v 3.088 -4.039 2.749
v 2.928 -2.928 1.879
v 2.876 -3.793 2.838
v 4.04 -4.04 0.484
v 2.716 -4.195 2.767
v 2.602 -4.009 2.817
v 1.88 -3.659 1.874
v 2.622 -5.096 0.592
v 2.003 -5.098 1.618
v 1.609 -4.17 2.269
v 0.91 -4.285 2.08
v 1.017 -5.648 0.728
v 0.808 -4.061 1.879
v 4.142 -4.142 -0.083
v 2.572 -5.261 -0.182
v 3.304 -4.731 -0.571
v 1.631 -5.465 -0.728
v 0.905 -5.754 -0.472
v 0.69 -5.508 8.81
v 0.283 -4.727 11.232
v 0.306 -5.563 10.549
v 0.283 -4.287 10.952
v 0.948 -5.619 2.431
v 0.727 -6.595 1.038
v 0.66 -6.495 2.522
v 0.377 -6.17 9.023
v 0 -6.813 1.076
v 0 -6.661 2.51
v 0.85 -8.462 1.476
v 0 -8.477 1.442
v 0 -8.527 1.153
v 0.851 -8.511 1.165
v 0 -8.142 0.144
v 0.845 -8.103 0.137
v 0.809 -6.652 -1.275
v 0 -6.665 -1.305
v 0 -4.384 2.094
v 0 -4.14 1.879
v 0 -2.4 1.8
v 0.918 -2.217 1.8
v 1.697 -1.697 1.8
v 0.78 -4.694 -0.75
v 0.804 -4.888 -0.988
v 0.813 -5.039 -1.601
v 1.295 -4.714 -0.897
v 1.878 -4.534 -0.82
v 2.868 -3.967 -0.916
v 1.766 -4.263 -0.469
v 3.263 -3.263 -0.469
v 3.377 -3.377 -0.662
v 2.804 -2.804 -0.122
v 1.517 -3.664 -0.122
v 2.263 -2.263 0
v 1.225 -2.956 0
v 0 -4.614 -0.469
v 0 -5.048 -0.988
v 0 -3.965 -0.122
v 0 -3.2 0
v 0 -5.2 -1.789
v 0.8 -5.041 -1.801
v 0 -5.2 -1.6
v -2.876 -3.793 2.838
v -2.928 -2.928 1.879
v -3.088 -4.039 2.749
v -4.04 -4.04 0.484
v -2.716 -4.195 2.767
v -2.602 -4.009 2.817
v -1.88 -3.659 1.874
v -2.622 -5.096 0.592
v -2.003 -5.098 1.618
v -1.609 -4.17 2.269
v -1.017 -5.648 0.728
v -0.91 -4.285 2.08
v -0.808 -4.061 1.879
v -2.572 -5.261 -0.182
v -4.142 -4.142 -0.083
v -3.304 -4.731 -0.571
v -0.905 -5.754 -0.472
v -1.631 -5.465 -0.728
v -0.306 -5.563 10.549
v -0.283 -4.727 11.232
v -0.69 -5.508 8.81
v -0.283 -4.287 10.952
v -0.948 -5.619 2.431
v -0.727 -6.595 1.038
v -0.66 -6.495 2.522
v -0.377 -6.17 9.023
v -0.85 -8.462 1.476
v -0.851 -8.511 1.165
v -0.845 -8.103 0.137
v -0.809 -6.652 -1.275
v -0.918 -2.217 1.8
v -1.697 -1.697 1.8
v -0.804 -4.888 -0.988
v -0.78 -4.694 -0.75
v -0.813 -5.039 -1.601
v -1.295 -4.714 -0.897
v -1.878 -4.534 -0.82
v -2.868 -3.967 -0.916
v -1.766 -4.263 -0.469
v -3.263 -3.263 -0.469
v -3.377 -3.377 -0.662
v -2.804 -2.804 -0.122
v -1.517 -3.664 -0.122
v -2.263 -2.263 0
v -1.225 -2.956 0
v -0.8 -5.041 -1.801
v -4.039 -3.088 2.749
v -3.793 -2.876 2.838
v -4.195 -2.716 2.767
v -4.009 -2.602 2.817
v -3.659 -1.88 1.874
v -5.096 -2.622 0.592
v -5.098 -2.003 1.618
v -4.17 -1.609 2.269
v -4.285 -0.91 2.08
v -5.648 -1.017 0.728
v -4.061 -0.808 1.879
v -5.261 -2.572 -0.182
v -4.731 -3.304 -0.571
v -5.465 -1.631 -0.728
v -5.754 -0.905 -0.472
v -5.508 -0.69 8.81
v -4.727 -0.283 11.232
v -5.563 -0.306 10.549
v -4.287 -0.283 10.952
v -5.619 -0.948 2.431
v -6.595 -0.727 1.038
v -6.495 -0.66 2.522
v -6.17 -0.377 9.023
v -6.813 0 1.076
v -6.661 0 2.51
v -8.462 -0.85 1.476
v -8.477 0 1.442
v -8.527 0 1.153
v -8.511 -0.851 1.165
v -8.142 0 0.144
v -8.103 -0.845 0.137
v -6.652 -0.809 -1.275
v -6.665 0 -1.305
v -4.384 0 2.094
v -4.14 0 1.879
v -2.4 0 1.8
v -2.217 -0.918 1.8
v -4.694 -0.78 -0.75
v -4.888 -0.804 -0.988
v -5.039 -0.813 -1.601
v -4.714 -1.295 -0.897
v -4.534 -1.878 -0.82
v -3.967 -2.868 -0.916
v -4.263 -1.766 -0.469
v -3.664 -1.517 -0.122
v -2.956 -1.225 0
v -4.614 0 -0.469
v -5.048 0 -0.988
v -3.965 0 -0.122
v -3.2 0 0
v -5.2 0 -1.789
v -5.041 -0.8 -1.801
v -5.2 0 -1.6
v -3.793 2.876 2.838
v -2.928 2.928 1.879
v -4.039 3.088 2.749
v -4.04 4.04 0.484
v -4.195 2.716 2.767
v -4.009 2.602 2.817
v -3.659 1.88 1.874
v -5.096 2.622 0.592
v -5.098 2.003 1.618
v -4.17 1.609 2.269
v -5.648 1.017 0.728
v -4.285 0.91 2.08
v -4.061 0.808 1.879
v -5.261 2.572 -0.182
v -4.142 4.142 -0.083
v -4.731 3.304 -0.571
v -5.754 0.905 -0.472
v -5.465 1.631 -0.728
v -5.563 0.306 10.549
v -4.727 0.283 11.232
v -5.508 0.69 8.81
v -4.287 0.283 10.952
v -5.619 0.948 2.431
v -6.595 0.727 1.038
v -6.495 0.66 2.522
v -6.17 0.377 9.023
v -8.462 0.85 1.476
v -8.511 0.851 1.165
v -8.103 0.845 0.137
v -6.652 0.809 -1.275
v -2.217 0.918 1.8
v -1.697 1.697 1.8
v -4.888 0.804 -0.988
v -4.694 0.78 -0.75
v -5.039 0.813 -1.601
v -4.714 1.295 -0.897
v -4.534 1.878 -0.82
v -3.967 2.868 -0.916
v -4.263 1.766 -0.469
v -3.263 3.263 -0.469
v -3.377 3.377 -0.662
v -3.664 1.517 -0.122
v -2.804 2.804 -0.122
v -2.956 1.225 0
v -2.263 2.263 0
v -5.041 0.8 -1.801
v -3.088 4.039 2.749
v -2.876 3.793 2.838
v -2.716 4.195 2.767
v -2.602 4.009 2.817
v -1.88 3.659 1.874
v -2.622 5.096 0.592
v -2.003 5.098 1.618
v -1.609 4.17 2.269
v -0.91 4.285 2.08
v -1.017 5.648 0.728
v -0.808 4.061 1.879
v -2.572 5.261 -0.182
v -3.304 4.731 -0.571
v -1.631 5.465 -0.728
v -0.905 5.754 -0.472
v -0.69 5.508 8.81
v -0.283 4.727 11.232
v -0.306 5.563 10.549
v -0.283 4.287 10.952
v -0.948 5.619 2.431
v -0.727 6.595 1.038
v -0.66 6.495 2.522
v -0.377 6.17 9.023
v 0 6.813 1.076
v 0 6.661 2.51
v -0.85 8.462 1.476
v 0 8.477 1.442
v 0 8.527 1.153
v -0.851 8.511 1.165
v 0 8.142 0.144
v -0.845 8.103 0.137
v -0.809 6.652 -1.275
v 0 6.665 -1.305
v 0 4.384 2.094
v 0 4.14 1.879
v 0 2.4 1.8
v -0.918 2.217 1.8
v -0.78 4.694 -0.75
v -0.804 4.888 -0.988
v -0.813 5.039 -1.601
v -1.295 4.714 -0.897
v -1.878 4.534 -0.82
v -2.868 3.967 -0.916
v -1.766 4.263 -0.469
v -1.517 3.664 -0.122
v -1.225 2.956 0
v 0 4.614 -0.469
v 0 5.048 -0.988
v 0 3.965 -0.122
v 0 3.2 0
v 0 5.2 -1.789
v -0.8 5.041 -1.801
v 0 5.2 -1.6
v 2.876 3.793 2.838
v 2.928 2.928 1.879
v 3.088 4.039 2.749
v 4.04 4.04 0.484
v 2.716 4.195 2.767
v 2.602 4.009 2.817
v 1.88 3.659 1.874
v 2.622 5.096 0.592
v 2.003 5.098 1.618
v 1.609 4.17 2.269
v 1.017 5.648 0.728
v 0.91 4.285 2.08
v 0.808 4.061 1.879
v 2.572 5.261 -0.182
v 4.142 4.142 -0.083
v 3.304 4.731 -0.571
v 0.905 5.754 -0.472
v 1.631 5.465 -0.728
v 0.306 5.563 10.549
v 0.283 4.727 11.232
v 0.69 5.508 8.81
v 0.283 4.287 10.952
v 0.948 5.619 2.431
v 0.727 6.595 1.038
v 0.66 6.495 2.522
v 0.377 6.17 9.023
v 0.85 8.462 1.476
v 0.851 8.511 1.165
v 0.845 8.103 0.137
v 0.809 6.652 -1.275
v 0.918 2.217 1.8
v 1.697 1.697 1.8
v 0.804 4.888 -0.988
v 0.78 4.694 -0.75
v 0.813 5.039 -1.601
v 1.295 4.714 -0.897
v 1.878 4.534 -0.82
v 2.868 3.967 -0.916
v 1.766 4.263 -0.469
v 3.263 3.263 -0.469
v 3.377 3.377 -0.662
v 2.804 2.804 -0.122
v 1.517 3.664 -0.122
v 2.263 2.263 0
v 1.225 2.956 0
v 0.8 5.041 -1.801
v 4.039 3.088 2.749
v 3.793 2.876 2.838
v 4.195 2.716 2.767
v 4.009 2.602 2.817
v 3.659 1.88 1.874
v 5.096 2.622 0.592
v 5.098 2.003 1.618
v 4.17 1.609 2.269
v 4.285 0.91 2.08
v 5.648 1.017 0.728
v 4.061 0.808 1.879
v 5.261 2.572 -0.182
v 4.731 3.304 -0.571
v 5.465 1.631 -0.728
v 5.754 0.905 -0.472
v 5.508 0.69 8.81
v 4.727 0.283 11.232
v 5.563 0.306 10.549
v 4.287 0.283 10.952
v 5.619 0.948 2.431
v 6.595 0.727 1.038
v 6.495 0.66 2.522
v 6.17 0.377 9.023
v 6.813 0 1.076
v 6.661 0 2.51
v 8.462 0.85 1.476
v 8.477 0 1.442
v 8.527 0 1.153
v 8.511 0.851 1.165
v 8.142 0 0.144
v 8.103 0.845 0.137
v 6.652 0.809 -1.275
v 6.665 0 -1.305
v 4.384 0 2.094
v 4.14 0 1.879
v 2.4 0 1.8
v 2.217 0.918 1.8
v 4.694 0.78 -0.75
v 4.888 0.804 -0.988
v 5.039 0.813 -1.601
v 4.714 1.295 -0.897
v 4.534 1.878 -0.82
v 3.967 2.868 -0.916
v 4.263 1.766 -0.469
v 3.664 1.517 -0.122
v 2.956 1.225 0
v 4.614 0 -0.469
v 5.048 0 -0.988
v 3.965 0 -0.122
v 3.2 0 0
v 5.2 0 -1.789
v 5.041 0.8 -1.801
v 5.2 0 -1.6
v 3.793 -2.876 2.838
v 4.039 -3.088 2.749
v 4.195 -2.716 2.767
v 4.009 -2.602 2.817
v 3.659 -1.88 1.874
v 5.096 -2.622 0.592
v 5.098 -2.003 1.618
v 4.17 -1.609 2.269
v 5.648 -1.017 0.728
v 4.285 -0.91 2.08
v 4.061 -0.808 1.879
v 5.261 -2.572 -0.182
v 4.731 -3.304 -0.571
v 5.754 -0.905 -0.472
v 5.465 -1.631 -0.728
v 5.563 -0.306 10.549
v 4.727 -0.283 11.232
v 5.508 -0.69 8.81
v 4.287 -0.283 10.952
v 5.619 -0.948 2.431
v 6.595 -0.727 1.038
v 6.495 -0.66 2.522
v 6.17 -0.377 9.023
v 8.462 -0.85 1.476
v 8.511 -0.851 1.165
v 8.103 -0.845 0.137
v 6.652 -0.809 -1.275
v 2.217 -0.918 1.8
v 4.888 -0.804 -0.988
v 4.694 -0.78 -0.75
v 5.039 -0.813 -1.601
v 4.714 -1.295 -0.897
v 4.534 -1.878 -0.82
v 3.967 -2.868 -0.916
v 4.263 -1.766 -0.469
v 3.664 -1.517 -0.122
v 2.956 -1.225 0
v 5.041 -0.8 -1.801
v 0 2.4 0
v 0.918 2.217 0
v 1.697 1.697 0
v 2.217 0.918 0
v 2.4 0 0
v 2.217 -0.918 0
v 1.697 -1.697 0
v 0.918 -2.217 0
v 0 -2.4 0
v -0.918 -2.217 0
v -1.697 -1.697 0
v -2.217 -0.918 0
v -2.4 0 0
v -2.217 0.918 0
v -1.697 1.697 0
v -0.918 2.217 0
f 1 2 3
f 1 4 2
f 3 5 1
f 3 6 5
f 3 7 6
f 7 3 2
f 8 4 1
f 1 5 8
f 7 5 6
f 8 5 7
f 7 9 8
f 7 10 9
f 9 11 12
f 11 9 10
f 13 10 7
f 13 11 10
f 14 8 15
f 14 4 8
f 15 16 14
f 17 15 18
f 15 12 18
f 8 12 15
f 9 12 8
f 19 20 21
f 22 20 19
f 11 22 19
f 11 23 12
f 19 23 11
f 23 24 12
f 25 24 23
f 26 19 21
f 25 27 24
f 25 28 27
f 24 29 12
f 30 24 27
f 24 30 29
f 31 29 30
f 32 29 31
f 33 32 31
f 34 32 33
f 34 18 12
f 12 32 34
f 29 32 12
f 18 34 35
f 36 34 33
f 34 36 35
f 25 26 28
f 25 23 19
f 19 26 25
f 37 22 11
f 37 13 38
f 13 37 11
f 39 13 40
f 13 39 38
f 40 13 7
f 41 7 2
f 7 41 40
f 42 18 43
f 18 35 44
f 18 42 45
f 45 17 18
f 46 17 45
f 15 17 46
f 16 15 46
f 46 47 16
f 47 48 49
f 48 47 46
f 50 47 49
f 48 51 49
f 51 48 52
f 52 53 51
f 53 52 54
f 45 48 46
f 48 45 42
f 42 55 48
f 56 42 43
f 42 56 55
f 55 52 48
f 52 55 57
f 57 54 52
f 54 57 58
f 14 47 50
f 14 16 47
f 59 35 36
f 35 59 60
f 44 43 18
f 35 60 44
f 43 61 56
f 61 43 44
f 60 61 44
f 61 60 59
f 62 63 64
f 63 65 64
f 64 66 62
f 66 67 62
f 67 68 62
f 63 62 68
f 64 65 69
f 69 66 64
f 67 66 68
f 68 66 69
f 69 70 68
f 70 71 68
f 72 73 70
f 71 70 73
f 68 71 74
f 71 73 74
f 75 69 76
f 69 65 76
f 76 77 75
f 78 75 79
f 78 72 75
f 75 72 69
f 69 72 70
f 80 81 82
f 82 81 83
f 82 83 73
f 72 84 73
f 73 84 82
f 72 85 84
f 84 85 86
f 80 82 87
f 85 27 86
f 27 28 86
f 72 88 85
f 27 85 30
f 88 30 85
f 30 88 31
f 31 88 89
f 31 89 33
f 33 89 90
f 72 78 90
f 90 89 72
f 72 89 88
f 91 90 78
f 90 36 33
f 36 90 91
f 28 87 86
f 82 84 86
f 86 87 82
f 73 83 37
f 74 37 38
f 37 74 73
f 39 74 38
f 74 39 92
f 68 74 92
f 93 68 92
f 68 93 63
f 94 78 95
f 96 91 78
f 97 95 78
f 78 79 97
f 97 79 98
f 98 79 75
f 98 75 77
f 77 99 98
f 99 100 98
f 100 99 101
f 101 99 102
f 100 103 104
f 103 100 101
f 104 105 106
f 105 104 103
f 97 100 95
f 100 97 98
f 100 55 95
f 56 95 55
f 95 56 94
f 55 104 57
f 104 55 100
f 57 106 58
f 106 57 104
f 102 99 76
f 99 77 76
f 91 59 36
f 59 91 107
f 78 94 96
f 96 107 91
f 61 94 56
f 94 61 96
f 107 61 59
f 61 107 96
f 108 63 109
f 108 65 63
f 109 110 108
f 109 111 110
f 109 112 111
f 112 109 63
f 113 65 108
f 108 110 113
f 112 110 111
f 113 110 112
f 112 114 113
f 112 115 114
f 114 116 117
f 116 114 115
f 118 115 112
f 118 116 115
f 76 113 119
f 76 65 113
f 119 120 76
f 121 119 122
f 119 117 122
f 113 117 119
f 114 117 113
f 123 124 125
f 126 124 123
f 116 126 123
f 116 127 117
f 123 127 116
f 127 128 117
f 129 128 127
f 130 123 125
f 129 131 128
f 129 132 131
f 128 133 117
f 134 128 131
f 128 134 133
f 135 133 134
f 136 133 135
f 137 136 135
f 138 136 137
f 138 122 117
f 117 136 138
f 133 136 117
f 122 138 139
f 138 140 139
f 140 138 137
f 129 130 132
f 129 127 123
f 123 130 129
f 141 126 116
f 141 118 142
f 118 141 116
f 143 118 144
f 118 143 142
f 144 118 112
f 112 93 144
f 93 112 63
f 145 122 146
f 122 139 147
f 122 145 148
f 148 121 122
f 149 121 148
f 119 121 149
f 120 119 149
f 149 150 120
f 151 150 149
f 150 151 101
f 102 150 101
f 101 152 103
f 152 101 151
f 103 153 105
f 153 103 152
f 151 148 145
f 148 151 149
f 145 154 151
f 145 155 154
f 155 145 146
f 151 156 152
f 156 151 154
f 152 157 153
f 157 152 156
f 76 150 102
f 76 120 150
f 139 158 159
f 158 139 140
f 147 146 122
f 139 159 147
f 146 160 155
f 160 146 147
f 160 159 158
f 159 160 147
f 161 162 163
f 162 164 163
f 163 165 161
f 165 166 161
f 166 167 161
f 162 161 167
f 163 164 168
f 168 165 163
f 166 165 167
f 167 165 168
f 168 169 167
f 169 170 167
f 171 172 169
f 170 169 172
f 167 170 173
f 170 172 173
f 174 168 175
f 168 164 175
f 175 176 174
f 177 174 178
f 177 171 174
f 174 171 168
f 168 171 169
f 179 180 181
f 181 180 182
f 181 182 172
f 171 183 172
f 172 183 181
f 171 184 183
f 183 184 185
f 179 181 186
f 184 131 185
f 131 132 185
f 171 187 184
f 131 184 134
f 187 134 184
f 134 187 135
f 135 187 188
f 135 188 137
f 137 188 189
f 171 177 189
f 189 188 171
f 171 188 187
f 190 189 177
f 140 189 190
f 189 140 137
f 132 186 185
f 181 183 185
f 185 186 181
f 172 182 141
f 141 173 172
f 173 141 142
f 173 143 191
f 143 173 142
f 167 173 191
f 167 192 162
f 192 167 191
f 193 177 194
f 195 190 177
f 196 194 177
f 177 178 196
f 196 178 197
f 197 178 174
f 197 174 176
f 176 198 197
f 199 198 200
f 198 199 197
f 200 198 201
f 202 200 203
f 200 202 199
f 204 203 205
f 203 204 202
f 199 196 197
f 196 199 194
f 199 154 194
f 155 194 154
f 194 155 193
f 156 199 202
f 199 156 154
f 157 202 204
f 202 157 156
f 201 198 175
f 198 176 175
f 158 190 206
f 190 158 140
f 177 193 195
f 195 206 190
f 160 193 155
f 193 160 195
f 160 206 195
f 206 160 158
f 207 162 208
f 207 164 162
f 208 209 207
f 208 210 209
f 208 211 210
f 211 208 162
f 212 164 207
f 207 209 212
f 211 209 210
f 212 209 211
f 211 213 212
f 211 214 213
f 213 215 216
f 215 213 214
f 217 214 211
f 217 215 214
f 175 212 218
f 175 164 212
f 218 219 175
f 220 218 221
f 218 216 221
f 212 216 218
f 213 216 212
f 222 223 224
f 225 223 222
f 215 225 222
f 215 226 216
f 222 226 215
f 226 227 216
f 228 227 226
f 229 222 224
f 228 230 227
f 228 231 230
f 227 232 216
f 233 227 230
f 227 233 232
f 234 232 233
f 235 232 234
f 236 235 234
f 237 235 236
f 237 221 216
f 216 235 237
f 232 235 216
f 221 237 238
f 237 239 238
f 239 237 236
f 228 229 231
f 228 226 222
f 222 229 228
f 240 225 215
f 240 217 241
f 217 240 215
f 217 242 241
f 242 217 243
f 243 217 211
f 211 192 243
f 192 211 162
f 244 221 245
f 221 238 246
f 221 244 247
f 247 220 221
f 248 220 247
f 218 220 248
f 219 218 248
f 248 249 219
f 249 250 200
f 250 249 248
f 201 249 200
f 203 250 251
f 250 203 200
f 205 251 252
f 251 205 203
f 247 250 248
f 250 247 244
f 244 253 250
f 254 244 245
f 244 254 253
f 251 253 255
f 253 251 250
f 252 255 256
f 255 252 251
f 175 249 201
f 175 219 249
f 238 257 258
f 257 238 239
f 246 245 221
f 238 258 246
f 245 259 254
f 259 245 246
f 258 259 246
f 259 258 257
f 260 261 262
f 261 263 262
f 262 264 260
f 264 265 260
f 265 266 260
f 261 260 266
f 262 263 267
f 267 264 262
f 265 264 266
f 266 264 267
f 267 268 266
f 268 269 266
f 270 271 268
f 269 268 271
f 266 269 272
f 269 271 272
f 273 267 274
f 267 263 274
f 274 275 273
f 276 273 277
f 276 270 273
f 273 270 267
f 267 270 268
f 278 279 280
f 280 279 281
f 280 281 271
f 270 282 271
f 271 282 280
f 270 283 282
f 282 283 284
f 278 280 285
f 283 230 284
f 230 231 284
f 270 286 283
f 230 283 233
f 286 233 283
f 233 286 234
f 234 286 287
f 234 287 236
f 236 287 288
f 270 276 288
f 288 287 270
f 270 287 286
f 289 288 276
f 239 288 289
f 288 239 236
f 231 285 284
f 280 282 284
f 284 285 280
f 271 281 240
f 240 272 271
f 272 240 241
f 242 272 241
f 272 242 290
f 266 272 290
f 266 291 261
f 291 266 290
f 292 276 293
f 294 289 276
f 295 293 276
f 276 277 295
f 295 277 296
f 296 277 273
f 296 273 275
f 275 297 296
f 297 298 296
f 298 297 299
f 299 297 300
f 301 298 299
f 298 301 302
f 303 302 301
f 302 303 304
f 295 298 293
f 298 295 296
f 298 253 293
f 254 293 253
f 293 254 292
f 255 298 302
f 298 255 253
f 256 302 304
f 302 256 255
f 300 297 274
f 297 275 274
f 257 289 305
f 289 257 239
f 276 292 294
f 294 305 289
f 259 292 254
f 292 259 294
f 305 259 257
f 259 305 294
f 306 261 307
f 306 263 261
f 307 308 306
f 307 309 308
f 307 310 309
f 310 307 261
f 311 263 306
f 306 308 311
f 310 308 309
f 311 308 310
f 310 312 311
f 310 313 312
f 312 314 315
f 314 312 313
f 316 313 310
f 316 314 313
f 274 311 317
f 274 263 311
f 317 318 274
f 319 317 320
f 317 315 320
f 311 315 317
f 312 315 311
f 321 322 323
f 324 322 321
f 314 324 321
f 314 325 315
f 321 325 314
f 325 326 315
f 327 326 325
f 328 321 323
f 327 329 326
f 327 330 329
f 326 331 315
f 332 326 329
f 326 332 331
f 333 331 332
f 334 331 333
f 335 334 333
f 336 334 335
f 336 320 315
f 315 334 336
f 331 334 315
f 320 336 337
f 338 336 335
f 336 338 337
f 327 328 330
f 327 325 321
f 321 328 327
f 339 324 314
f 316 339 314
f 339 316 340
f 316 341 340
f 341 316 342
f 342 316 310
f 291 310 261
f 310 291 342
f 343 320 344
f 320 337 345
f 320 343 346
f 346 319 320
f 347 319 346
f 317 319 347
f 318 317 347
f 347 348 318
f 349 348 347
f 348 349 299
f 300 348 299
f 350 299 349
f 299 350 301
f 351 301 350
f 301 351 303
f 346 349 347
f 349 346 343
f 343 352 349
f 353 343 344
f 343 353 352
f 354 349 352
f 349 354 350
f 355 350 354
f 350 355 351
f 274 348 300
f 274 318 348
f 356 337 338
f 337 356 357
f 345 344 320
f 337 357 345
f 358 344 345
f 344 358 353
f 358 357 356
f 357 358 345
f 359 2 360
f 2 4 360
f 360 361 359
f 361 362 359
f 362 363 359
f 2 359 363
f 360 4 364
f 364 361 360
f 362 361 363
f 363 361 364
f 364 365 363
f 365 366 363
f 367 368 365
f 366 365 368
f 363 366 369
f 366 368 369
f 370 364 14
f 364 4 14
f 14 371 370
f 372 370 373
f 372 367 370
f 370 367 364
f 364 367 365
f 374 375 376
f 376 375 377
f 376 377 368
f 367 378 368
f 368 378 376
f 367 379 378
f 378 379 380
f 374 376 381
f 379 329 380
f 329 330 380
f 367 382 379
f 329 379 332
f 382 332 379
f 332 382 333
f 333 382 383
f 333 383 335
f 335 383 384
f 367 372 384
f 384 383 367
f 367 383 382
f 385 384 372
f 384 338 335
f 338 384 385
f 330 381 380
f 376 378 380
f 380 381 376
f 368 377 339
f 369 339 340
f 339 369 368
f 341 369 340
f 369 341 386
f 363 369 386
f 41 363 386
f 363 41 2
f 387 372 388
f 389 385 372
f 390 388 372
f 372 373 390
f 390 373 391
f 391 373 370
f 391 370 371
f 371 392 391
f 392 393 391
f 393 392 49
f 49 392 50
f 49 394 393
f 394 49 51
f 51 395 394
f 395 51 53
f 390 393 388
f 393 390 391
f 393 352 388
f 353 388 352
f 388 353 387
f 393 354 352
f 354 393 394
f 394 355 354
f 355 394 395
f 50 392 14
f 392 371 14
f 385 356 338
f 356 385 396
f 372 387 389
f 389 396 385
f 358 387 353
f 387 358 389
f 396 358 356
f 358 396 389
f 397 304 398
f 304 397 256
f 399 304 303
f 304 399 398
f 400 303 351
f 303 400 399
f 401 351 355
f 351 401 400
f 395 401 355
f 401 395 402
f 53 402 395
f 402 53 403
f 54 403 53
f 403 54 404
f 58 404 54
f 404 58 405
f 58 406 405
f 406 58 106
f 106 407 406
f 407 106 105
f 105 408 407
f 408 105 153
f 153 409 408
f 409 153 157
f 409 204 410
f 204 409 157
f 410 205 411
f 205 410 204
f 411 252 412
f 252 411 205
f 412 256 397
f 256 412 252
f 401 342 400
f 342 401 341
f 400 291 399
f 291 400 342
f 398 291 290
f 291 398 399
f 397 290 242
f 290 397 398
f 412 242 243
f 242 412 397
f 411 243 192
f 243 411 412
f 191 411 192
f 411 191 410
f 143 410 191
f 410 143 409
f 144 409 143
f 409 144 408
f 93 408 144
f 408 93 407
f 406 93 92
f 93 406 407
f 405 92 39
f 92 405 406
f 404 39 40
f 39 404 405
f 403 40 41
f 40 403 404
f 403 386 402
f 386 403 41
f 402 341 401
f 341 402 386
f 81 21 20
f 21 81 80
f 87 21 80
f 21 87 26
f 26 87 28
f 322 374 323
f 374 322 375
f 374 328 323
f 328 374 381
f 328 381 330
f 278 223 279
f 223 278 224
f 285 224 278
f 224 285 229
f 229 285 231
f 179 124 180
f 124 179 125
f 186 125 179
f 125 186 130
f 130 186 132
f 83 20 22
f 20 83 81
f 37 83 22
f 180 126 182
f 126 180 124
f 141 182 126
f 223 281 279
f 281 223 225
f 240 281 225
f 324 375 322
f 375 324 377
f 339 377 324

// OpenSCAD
// file: ../p/4-4edge.scad
use <../lib.scad>
function ldraw_lib__4_4edge() = [
// 0 Circle 1.0
// 0 Name: 4-4edge.dat
// 0 Author: James Jessiman
// 0 !LDRAW_ORG Primitive UPDATE 2017-01
// 0 !LICENSE Licensed under CC BY 2.0 and CC BY 4.0 : see CAreadme.txt
// 
// 0 BFC CERTIFY CCW
  [0,"BFC","CERTIFY"],
  [0,"BFC","CCW"],
// 
// 0 !HISTORY 1998-12-15 [PTadmin] Official Update 1998-10
// 0 !HISTORY 2005-12-28 [PTadmin] Official Update 2005-01
// 0 !HISTORY 2007-06-24 [PTadmin] Header formatted for Contributor Agreement
// 0 !HISTORY 2008-07-01 [PTadmin] Official Update 2008-01
// 0 !HISTORY 2017-01-15 [Steffen] BFCed
// 0 !HISTORY 2017-12-30 [PTadmin] Official Update 2017-01
// 
// 
// 2 24 1 0 0 0.9239 0 0.3827
  [2,24,1,0,0,0.9239,0,0.3827],
// 2 24 0.9239 0 0.3827 0.7071 0 0.7071
  [2,24,0.9239,0,0.3827,0.7071,0,0.7071],
// 2 24 0.7071 0 0.7071 0.3827 0 0.9239
  [2,24,0.7071,0,0.7071,0.3827,0,0.9239],
// 2 24 0.3827 0 0.9239 0 0 1
  [2,24,0.3827,0,0.9239,0,0,1],
// 2 24 0 0 1 -0.3827 0 0.9239
  [2,24,0,0,1,-0.3827,0,0.9239],
// 2 24 -0.3827 0 0.9239 -0.7071 0 0.7071
  [2,24,-0.3827,0,0.9239,-0.7071,0,0.7071],
// 2 24 -0.7071 0 0.7071 -0.9239 0 0.3827
  [2,24,-0.7071,0,0.7071,-0.9239,0,0.3827],
// 2 24 -0.9239 0 0.3827 -1 0 -0
  [2,24,-0.9239,0,0.3827,-1,0,-0],
// 2 24 -1 0 -0 -0.9239 0 -0.3827
  [2,24,-1,0,-0,-0.9239,0,-0.3827],
// 2 24 -0.9239 0 -0.3827 -0.7071 0 -0.7071
  [2,24,-0.9239,0,-0.3827,-0.7071,0,-0.7071],
// 2 24 -0.7071 0 -0.7071 -0.3827 0 -0.9239
  [2,24,-0.7071,0,-0.7071,-0.3827,0,-0.9239],
// 2 24 -0.3827 0 -0.9239 0 0 -1
  [2,24,-0.3827,0,-0.9239,0,0,-1],
// 2 24 0 0 -1 0.3827 0 -0.9239
  [2,24,0,0,-1,0.3827,0,-0.9239],
// 2 24 0.3827 0 -0.9239 0.7071 0 -0.7071
  [2,24,0.3827,0,-0.9239,0.7071,0,-0.7071],
// 2 24 0.7071 0 -0.7071 0.9239 0 -0.3827
  [2,24,0.7071,0,-0.7071,0.9239,0,-0.3827],
// 2 24 0.9239 0 -0.3827 1 0 0
  [2,24,0.9239,0,-0.3827,1,0,0],
];
module ldraw_lib__4_4edge(step=0, col=false, unit=2/5, alt=false, line=0.2, solid=!$preview)
    makepoly(ldraw_lib__4_4edge(), step=step, col=col, unit=unit, alt=alt, line=line, solid=solid);
ldraw_lib__4_4edge(line=0.2);
// file: ../p/4-4cyli.scad
use <../lib.scad>
function ldraw_lib__4_4cyli() = [
// 0 Cylinder 1.0
// 0 Name: 4-4cyli.dat
// 0 Author: James Jessiman
// 0 !LDRAW_ORG Primitive UPDATE 2005-01
// 0 !LICENSE Licensed under CC BY 2.0 and CC BY 4.0 : see CAreadme.txt
// 
// 0 BFC CERTIFY CCW
  [0,"BFC","CERTIFY"],
  [0,"BFC","CCW"],
// 
// 0 !HISTORY 1998-12-15 [PTadmin] Official Update 1998-10
// 0 !HISTORY 2002-03-23 [sbliss] Added BFC statement; merged headers from files in distributions LDraw 0.27 and Complete.
// 0 !HISTORY 2002-04-25 [PTadmin] Official Update 2002-02
// 0 !HISTORY 2004-12-14 [guyvivan] BFC CCW
// 0 !HISTORY 2005-12-28 [PTadmin] Official Update 2005-01
// 0 !HISTORY 2007-06-24 [PTadmin] Header formatted for Contributor Agreement
// 0 !HISTORY 2008-07-01 [PTadmin] Official Update 2008-01
// 
// 
// 4 16 1 1 0 0.9239 1 0.3827 0.9239 0 0.3827 1 0 0
  [4,16,1,1,0,0.9239,1,0.3827,0.9239,0,0.3827,1,0,0],
// 5 24 1 0 0 1 1 0 0.9239 0 0.3827 0.9239 0 -0.3827
  [5,24,1,0,0,1,1,0,0.9239,0,0.3827,0.9239,0,-0.3827],
// 4 16 0.9239 1 0.3827 0.7071 1 0.7071 0.7071 0 0.7071 0.9239 0 0.3827
  [4,16,0.9239,1,0.3827,0.7071,1,0.7071,0.7071,0,0.7071,0.9239,0,0.3827],
// 5 24 0.9239 0 0.3827 0.9239 1 0.3827 0.7071 0 0.7071 1 0 0
  [5,24,0.9239,0,0.3827,0.9239,1,0.3827,0.7071,0,0.7071,1,0,0],
// 4 16 0.7071 1 0.7071 0.3827 1 0.9239 0.3827 0 0.9239 0.7071 0 0.7071
  [4,16,0.7071,1,0.7071,0.3827,1,0.9239,0.3827,0,0.9239,0.7071,0,0.7071],
// 5 24 0.7071 0 0.7071 0.7071 1 0.7071 0.3827 0 0.9239 0.9239 0 0.3827
  [5,24,0.7071,0,0.7071,0.7071,1,0.7071,0.3827,0,0.9239,0.9239,0,0.3827],
// 4 16 0.3827 1 0.9239 0 1 1 0 0 1 0.3827 0 0.9239
  [4,16,0.3827,1,0.9239,0,1,1,0,0,1,0.3827,0,0.9239],
// 5 24 0.3827 0 0.9239 0.3827 1 0.9239 0 0 1 0.7071 0 0.7071
  [5,24,0.3827,0,0.9239,0.3827,1,0.9239,0,0,1,0.7071,0,0.7071],
// 4 16 0 1 1 -0.3827 1 0.9239 -0.3827 0 0.9239 0 0 1
  [4,16,0,1,1,-0.3827,1,0.9239,-0.3827,0,0.9239,0,0,1],
// 5 24 0 0 1 0 1 1 -0.3827 0 0.9239 0.3827 0 0.9239
  [5,24,0,0,1,0,1,1,-0.3827,0,0.9239,0.3827,0,0.9239],
// 4 16 -0.3827 1 0.9239 -0.7071 1 0.7071 -0.7071 0 0.7071 -0.3827 0 0.9239
  [4,16,-0.3827,1,0.9239,-0.7071,1,0.7071,-0.7071,0,0.7071,-0.3827,0,0.9239],
// 5 24 -0.3827 0 0.9239 -0.3827 1 0.9239 -0.7071 0 0.7071 0 0 1
  [5,24,-0.3827,0,0.9239,-0.3827,1,0.9239,-0.7071,0,0.7071,0,0,1],
// 4 16 -0.7071 1 0.7071 -0.9239 1 0.3827 -0.9239 0 0.3827 -0.7071 0 0.7071
  [4,16,-0.7071,1,0.7071,-0.9239,1,0.3827,-0.9239,0,0.3827,-0.7071,0,0.7071],
// 5 24 -0.7071 0 0.7071 -0.7071 1 0.7071 -0.9239 0 0.3827 -0.3827 0 0.9239
  [5,24,-0.7071,0,0.7071,-0.7071,1,0.7071,-0.9239,0,0.3827,-0.3827,0,0.9239],
// 4 16 -0.9239 1 0.3827 -1 1 0 -1 0 0 -0.9239 0 0.3827
  [4,16,-0.9239,1,0.3827,-1,1,0,-1,0,0,-0.9239,0,0.3827],
// 5 24 -0.9239 0 0.3827 -0.9239 1 0.3827 -1 0 0 -0.7071 0 0.7071
  [5,24,-0.9239,0,0.3827,-0.9239,1,0.3827,-1,0,0,-0.7071,0,0.7071],
// 4 16 -1 1 0 -0.9239 1 -0.3827 -0.9239 0 -0.3827 -1 0 0
  [4,16,-1,1,0,-0.9239,1,-0.3827,-0.9239,0,-0.3827,-1,0,0],
// 5 24 -1 0 0 -1 1 0 -0.9239 0 -0.3827 -0.9239 0 0.3827
  [5,24,-1,0,0,-1,1,0,-0.9239,0,-0.3827,-0.9239,0,0.3827],
// 4 16 -0.9239 1 -0.3827 -0.7071 1 -0.7071 -0.7071 0 -0.7071 -0.9239 0 -0.3827
  [4,16,-0.9239,1,-0.3827,-0.7071,1,-0.7071,-0.7071,0,-0.7071,-0.9239,0,-0.3827],
// 5 24 -0.9239 0 -0.3827 -0.9239 1 -0.3827 -0.7071 0 -0.7071 -1 0 0
  [5,24,-0.9239,0,-0.3827,-0.9239,1,-0.3827,-0.7071,0,-0.7071,-1,0,0],
// 4 16 -0.7071 1 -0.7071 -0.3827 1 -0.9239 -0.3827 0 -0.9239 -0.7071 0 -0.7071
  [4,16,-0.7071,1,-0.7071,-0.3827,1,-0.9239,-0.3827,0,-0.9239,-0.7071,0,-0.7071],
// 5 24 -0.7071 0 -0.7071 -0.7071 1 -0.7071 -0.3827 0 -0.9239 -0.9239 0 -0.3827
  [5,24,-0.7071,0,-0.7071,-0.7071,1,-0.7071,-0.3827,0,-0.9239,-0.9239,0,-0.3827],
// 4 16 -0.3827 1 -0.9239 0 1 -1 0 0 -1 -0.3827 0 -0.9239
  [4,16,-0.3827,1,-0.9239,0,1,-1,0,0,-1,-0.3827,0,-0.9239],
// 5 24 -0.3827 0 -0.9239 -0.3827 1 -0.9239 0 0 -1 -0.7071 0 -0.7071
  [5,24,-0.3827,0,-0.9239,-0.3827,1,-0.9239,0,0,-1,-0.7071,0,-0.7071],
// 4 16 0 1 -1 0.3827 1 -0.9239 0.3827 0 -0.9239 0 0 -1
  [4,16,0,1,-1,0.3827,1,-0.9239,0.3827,0,-0.9239,0,0,-1],
// 5 24 0 0 -1 0 1 -1 0.3827 0 -0.9239 -0.3827 0 -0.9239
  [5,24,0,0,-1,0,1,-1,0.3827,0,-0.9239,-0.3827,0,-0.9239],
// 4 16 0.3827 1 -0.9239 0.7071 1 -0.7071 0.7071 0 -0.7071 0.3827 0 -0.9239
  [4,16,0.3827,1,-0.9239,0.7071,1,-0.7071,0.7071,0,-0.7071,0.3827,0,-0.9239],
// 5 24 0.3827 0 -0.9239 0.3827 1 -0.9239 0.7071 0 -0.7071 0 0 -1
  [5,24,0.3827,0,-0.9239,0.3827,1,-0.9239,0.7071,0,-0.7071,0,0,-1],
// 4 16 0.7071 1 -0.7071 0.9239 1 -0.3827 0.9239 0 -0.3827 0.7071 0 -0.7071
  [4,16,0.7071,1,-0.7071,0.9239,1,-0.3827,0.9239,0,-0.3827,0.7071,0,-0.7071],
// 5 24 0.7071 0 -0.7071 0.7071 1 -0.7071 0.9239 0 -0.3827 0.3827 0 -0.9239
  [5,24,0.7071,0,-0.7071,0.7071,1,-0.7071,0.9239,0,-0.3827,0.3827,0,-0.9239],
// 4 16 0.9239 1 -0.3827 1 1 0 1 0 0 0.9239 0 -0.3827
  [4,16,0.9239,1,-0.3827,1,1,0,1,0,0,0.9239,0,-0.3827],
// 5 24 0.9239 0 -0.3827 0.9239 1 -0.3827 1 0 0 0.7071 0 -0.7071
  [5,24,0.9239,0,-0.3827,0.9239,1,-0.3827,1,0,0,0.7071,0,-0.7071],
// 0
];
module ldraw_lib__4_4cyli(step=0, col=false, unit=2/5, alt=false, line=0.2, solid=!$preview)
    makepoly(ldraw_lib__4_4cyli(), step=step, col=col, unit=unit, alt=alt, line=line, solid=solid);
ldraw_lib__4_4cyli(line=0.2);
// file: ../p/4-4ring3.scad
use <../lib.scad>
function ldraw_lib__4_4ring3() = [
// 0 Ring  3 x 1.0
// 0 Name: 4-4ring3.dat
// 0 Author: James Jessiman
// 0 !LDRAW_ORG Primitive UPDATE 2009-01
// 0 !LICENSE Licensed under CC BY 2.0 and CC BY 4.0 : see CAreadme.txt
// 
// 0 BFC CERTIFY CCW
  [0,"BFC","CERTIFY"],
  [0,"BFC","CCW"],
// 
// 0 !HISTORY 1998-12-15 [PTadmin] Official Update 1998-10
// 0 !HISTORY 2002-04-05 [hafhead] Added BFC statement
// 0 !HISTORY 2002-04-25 [PTadmin] Official Update 2002-02
// 0 !HISTORY 2007-06-24 [PTadmin] Header formatted for Contributor Agreement
// 0 !HISTORY 2008-07-01 [PTadmin] Official Update 2008-01
// 0 !HISTORY 2008-08-26 [cwdee] Switch polygon winding and rename
// 0 !HISTORY 2009-05-02 [PTadmin] Official Update 2009-01
// 
// 
// 4 16 -1.5308 0 3.6956 -1.1481 0 2.7717 0 0 3 0 0 4
  [4,16,-1.5308,0,3.6956,-1.1481,0,2.7717,0,0,3,0,0,4],
// 4 16 -2.8284 0 2.8284 -2.1213 0 2.1213 -1.1481 0 2.7717 -1.5308 0 3.6956
  [4,16,-2.8284,0,2.8284,-2.1213,0,2.1213,-1.1481,0,2.7717,-1.5308,0,3.6956],
// 4 16 -3.6956 0 1.5308 -2.7717 0 1.1481 -2.1213 0 2.1213 -2.8284 0 2.8284
  [4,16,-3.6956,0,1.5308,-2.7717,0,1.1481,-2.1213,0,2.1213,-2.8284,0,2.8284],
// 4 16 -4 0 0 -3 0 0 -2.7717 0 1.1481 -3.6956 0 1.5308
  [4,16,-4,0,0,-3,0,0,-2.7717,0,1.1481,-3.6956,0,1.5308],
// 4 16 -3.6956 0 -1.5308 -2.7717 0 -1.1481 -3 0 0 -4 0 0
  [4,16,-3.6956,0,-1.5308,-2.7717,0,-1.1481,-3,0,0,-4,0,0],
// 4 16 -2.8284 0 -2.8284 -2.1213 0 -2.1213 -2.7717 0 -1.1481 -3.6956 0 -1.5308
  [4,16,-2.8284,0,-2.8284,-2.1213,0,-2.1213,-2.7717,0,-1.1481,-3.6956,0,-1.5308],
// 4 16 -1.5308 0 -3.6956 -1.1481 0 -2.7717 -2.1213 0 -2.1213 -2.8284 0 -2.8284
  [4,16,-1.5308,0,-3.6956,-1.1481,0,-2.7717,-2.1213,0,-2.1213,-2.8284,0,-2.8284],
// 4 16 0 0 -4 0 0 -3 -1.1481 0 -2.7717 -1.5308 0 -3.6956
  [4,16,0,0,-4,0,0,-3,-1.1481,0,-2.7717,-1.5308,0,-3.6956],
// 4 16 1.5308 0 -3.6956 1.1481 0 -2.7717 0 0 -3 0 0 -4
  [4,16,1.5308,0,-3.6956,1.1481,0,-2.7717,0,0,-3,0,0,-4],
// 4 16 2.8284 0 -2.8284 2.1213 0 -2.1213 1.1481 0 -2.7717 1.5308 0 -3.6956
  [4,16,2.8284,0,-2.8284,2.1213,0,-2.1213,1.1481,0,-2.7717,1.5308,0,-3.6956],
// 4 16 3.6956 0 -1.5308 2.7717 0 -1.1481 2.1213 0 -2.1213 2.8284 0 -2.8284
  [4,16,3.6956,0,-1.5308,2.7717,0,-1.1481,2.1213,0,-2.1213,2.8284,0,-2.8284],
// 4 16 4 0 0 3 0 0 2.7717 0 -1.1481 3.6956 0 -1.5308
  [4,16,4,0,0,3,0,0,2.7717,0,-1.1481,3.6956,0,-1.5308],
// 4 16 3.6956 0 1.5308 2.7717 0 1.1481 3 0 0 4 0 0
  [4,16,3.6956,0,1.5308,2.7717,0,1.1481,3,0,0,4,0,0],
// 4 16 2.8284 0 2.8284 2.1213 0 2.1213 2.7717 0 1.1481 3.6956 0 1.5308
  [4,16,2.8284,0,2.8284,2.1213,0,2.1213,2.7717,0,1.1481,3.6956,0,1.5308],
// 4 16 1.5308 0 3.6956 1.1481 0 2.7717 2.1213 0 2.1213 2.8284 0 2.8284
  [4,16,1.5308,0,3.6956,1.1481,0,2.7717,2.1213,0,2.1213,2.8284,0,2.8284],
// 4 16 0 0 4 0 0 3 1.1481 0 2.7717 1.5308 0 3.6956
  [4,16,0,0,4,0,0,3,1.1481,0,2.7717,1.5308,0,3.6956],
// 0
];
module ldraw_lib__4_4ring3(step=0, col=false, unit=2/5, alt=false, line=0.2, solid=!$preview)
    makepoly(ldraw_lib__4_4ring3(), step=step, col=col, unit=unit, alt=alt, line=line, solid=solid);
ldraw_lib__4_4ring3(line=0.2);
// file: ../p/4-4cylo.scad
use <../lib.scad>
use <4-4cyli.scad>
use <4-4edge.scad>
function ldraw_lib__4_4cylo() = [
// 0 Cylinder Open 1.0
// 0 Name: 4-4cylo.dat
// 0 Author: Mark Kennedy [mkennedy]
// 0 !LDRAW_ORG Primitive UPDATE 2010-01
// 0 !LICENSE Licensed under CC BY 2.0 and CC BY 4.0 : see CAreadme.txt
// 
// 0 BFC CERTIFY CCW
  [0,"BFC","CERTIFY"],
  [0,"BFC","CCW"],
// 
// 0 !HISTORY 2010-04-05 [PTadmin] Official Update 2010-01
// 
// 
// 1 16 0 0 0 1 0 0 0 1 0 0 0 1 4-4edge.dat
  [1,16,0,0,0,1,0,0,0,1,0,0,0,1, ldraw_lib__4_4edge()],
// 1 16 0 1 0 1 0 0 0 1 0 0 0 1 4-4edge.dat
  [1,16,0,1,0,1,0,0,0,1,0,0,0,1, ldraw_lib__4_4edge()],
// 1 16 0 0 0 1 0 0 0 1 0 0 0 1 4-4cyli.dat
  [1,16,0,0,0,1,0,0,0,1,0,0,0,1, ldraw_lib__4_4cyli()],
// 0
];
module ldraw_lib__4_4cylo(step=0, col=false, unit=2/5, alt=false, line=0.2, solid=!$preview)
    makepoly(ldraw_lib__4_4cylo(), step=step, col=col, unit=unit, alt=alt, line=line, solid=solid);
ldraw_lib__4_4cylo(line=0.2);
// file: ../p/stud4od.scad
use <../lib.scad>
use <4-4cylo.scad>
use <4-4ring3.scad>
function ldraw_lib__stud4od() = [
// 0 Stud Tube Open without Outer Cylinder and Top Surface
// 0 Name: stud4od.dat
// 0 Author: Philippe Hurbain [Philo]
// 0 !LDRAW_ORG Primitive UPDATE 2013-02
// 0 !LICENSE Licensed under CC BY 2.0 and CC BY 4.0 : see CAreadme.txt
// 
// 0 !HELP This stud is a "antistud" to be used like a underside stud,
// 0 !HELP but without the outer cylinder.
// 0 !HELP 1 47 0 0 0 1 0 0 0 1 0 0 0 1 stud4.dat
// 
// 0 BFC CERTIFY CCW
  [0,"BFC","CERTIFY"],
  [0,"BFC","CCW"],
// 
// 0 !HISTORY 2013-12-23 [PTadmin] Official Update 2013-02
// 
// 
// 1 16 0 -4 0 2 0 0 0 1 0 0 0 2 4-4ring3.dat
  [1,16,0,-4,0,2,0,0,0,1,0,0,0,2, ldraw_lib__4_4ring3()],
// 0 BFC INVERTNEXT
  [0,"BFC","INVERTNEXT"],
// 1 16 0 0 0 -6 0 0 0 -4 0 0 0 6 4-4cylo.dat
  [1,16,0,0,0,-6,0,0,0,-4,0,0,0,6, ldraw_lib__4_4cylo()],
];
module ldraw_lib__stud4od(step=0, col=false, unit=2/5, alt=false, line=0.2, solid=!$preview)
    makepoly(ldraw_lib__stud4od(), step=step, col=col, unit=unit, alt=alt, line=line, solid=solid);
ldraw_lib__stud4od(line=0.2);
// main file
use <../lib.scad>
use <s/18165s01.scad>
use <../p/stud4od.scad>
function ldraw_lib__18165() = [
// 0 Minifig Crown with  4 Spikes
// 0 Name: 18165.dat
// 0 Author: Evert-Jan Boer [ejboer]
// 0 !LDRAW_ORG Part UPDATE 2022-04
// 0 !LICENSE Licensed under CC BY 2.0 and CC BY 4.0 : see CAreadme.txt
// 
// 0 BFC CERTIFY CCW
  [0,"BFC","CERTIFY"],
  [0,"BFC","CCW"],
// 
// 0 !CATEGORY Minifig Headwear
// 
// 0 !HISTORY 2016-03-18 {LEGO Digital Designer} Original part shape
// 0 !HISTORY 2017-06-30 [ejboer] File preparation for LDraw Parts Tracker
// 0 !HISTORY 2019-04-14 [MagFors] Reshaped the four spikes
// 0 !HISTORY 2022-07-18 [PTadmin] Official Update 2022-04
// 
// 
// 1 16 0 0 0 1 0 0 0 1 0 0 0 1 s\18165s01.dat
  [1,16,0,0,0,1,0,0,0,1,0,0,0,1, ldraw_lib__s__18165s01()],
// 1 16 0 0 0 -1 0 0 0 1 0 0 0 1 s\18165s01.dat
  [1,16,0,0,0,-1,0,0,0,1,0,0,0,1, ldraw_lib__s__18165s01()],
// 1 16 0 0 0 0 0 1 0 1 0 -1 0 0 s\18165s01.dat
  [1,16,0,0,0,0,0,1,0,1,0,-1,0,0, ldraw_lib__s__18165s01()],
// 1 16 0 0 0 0 0 1 0 1 0 1 0 0 s\18165s01.dat
  [1,16,0,0,0,0,0,1,0,1,0,1,0,0, ldraw_lib__s__18165s01()],
// 1 16 0 0 0 -1 0 0 0 1 0 0 0 -1 s\18165s01.dat
  [1,16,0,0,0,-1,0,0,0,1,0,0,0,-1, ldraw_lib__s__18165s01()],
// 1 16 0 0 0 1 0 0 0 1 0 0 0 -1 s\18165s01.dat
  [1,16,0,0,0,1,0,0,0,1,0,0,0,-1, ldraw_lib__s__18165s01()],
// 1 16 0 0 0 0 0 -1 0 1 0 1 0 0 s\18165s01.dat
  [1,16,0,0,0,0,0,-1,0,1,0,1,0,0, ldraw_lib__s__18165s01()],
// 1 16 0 0 0 0 0 -1 0 1 0 -1 0 0 s\18165s01.dat
  [1,16,0,0,0,0,0,-1,0,1,0,-1,0,0, ldraw_lib__s__18165s01()],
// 
// 1 16 0 -4.5 0 -1 0 0 0 -1.125 0 0 0 1 stud4od.dat
  [1,16,0,-4.5,0,-1,0,0,0,-1.125,0,0,0,1, ldraw_lib__stud4od()],
// 
// 4 16 -.7064 -28.08 -11.8179 -.7644 -26.373 -13.9067 .7644 -26.373 -13.9067 .7064 -28.08 -11.8179
  [4,16,-.7064,-28.08,-11.8179,-.7644,-26.373,-13.9067,.7644,-26.373,-13.9067,.7064,-28.08,-11.8179],
// 4 16 .7644 -26.373 -13.9067 -.7644 -26.373 -13.9067 -.9426 -22.557 -15.4241 .9426 -22.557 -15.4241
  [4,16,.7644,-26.373,-13.9067,-.7644,-26.373,-13.9067,-.9426,-22.557,-15.4241,.9426,-22.557,-15.4241],
// 3 16 .9426 -22.557 -15.4241 -.9426 -22.557 -15.4241 0 -6.275 -16.6524
  [3,16,.9426,-22.557,-15.4241,-.9426,-22.557,-15.4241,0,-6.275,-16.6524],
// 4 16 11.8179 -28.08 -.7064 13.9067 -26.373 -.7644 13.9067 -26.373 .7644 11.8179 -28.08 .7064
  [4,16,11.8179,-28.08,-.7064,13.9067,-26.373,-.7644,13.9067,-26.373,.7644,11.8179,-28.08,.7064],
// 4 16 13.9067 -26.373 .7644 13.9067 -26.373 -.7644 15.4241 -22.557 -.9426 15.4241 -22.557 .9426
  [4,16,13.9067,-26.373,.7644,13.9067,-26.373,-.7644,15.4241,-22.557,-.9426,15.4241,-22.557,.9426],
// 3 16 15.4241 -22.557 .9426 15.4241 -22.557 -.9426 16.6524 -6.275 0
  [3,16,15.4241,-22.557,.9426,15.4241,-22.557,-.9426,16.6524,-6.275,0],
// 4 16 .7064 -28.08 11.8179 .7644 -26.373 13.9067 -.7644 -26.373 13.9067 -.7064 -28.08 11.8179
  [4,16,.7064,-28.08,11.8179,.7644,-26.373,13.9067,-.7644,-26.373,13.9067,-.7064,-28.08,11.8179],
// 4 16 -.7644 -26.373 13.9067 .7644 -26.373 13.9067 .9426 -22.557 15.4241 -.9426 -22.557 15.4241
  [4,16,-.7644,-26.373,13.9067,.7644,-26.373,13.9067,.9426,-22.557,15.4241,-.9426,-22.557,15.4241],
// 3 16 -.9426 -22.557 15.4241 .9426 -22.557 15.4241 0 -6.275 16.6524
  [3,16,-.9426,-22.557,15.4241,.9426,-22.557,15.4241,0,-6.275,16.6524],
// 4 16 -11.8179 -28.08 .7064 -13.9067 -26.373 .7644 -13.9067 -26.373 -.7644 -11.8179 -28.08 -.7064
  [4,16,-11.8179,-28.08,.7064,-13.9067,-26.373,.7644,-13.9067,-26.373,-.7644,-11.8179,-28.08,-.7064],
// 4 16 -13.9067 -26.373 -.7644 -13.9067 -26.373 .7644 -15.4241 -22.557 .9426 -15.4241 -22.557 -.9426
  [4,16,-13.9067,-26.373,-.7644,-13.9067,-26.373,.7644,-15.4241,-22.557,.9426,-15.4241,-22.557,-.9426],
// 3 16 -15.4241 -22.557 -.9426 -15.4241 -22.557 .9426 -16.6524 -6.275 0
  [3,16,-15.4241,-22.557,-.9426,-15.4241,-22.557,.9426,-16.6524,-6.275,0],
// 4 16 .7064 -27.38 -10.7179 -.7064 -27.38 -10.7179 -.7064 -28.08 -11.8179 .7064 -28.08 -11.8179
  [4,16,.7064,-27.38,-10.7179,-.7064,-27.38,-10.7179,-.7064,-28.08,-11.8179,.7064,-28.08,-11.8179],
// 3 16 0 -5.2355 -10.9594 -.7064 -27.38 -10.7179 .7064 -27.38 -10.7179
  [3,16,0,-5.2355,-10.9594,-.7064,-27.38,-10.7179,.7064,-27.38,-10.7179],
// 4 16 -10.7179 -27.38 -.7064 -10.7179 -27.38 .7064 -11.8179 -28.08 .7064 -11.8179 -28.08 -.7064
  [4,16,-10.7179,-27.38,-.7064,-10.7179,-27.38,.7064,-11.8179,-28.08,.7064,-11.8179,-28.08,-.7064],
// 3 16 -10.9594 -5.2355 0 -10.7179 -27.38 .7064 -10.7179 -27.38 -.7064
  [3,16,-10.9594,-5.2355,0,-10.7179,-27.38,.7064,-10.7179,-27.38,-.7064],
// 4 16 -.7064 -27.38 10.7179 .7064 -27.38 10.7179 .7064 -28.08 11.8179 -.7064 -28.08 11.8179
  [4,16,-.7064,-27.38,10.7179,.7064,-27.38,10.7179,.7064,-28.08,11.8179,-.7064,-28.08,11.8179],
// 3 16 0 -5.2355 10.9594 .7064 -27.38 10.7179 -.7064 -27.38 10.7179
  [3,16,0,-5.2355,10.9594,.7064,-27.38,10.7179,-.7064,-27.38,10.7179],
// 4 16 10.7179 -27.38 .7064 10.7179 -27.38 -.7064 11.8179 -28.08 -.7064 11.8179 -28.08 .7064
  [4,16,10.7179,-27.38,.7064,10.7179,-27.38,-.7064,11.8179,-28.08,-.7064,11.8179,-28.08,.7064],
// 3 16 10.9594 -5.2355 0 10.7179 -27.38 -.7064 10.7179 -27.38 .7064
  [3,16,10.9594,-5.2355,0,10.7179,-27.38,-.7064,10.7179,-27.38,.7064],
];
module ldraw_lib__18165(step=0, col=false, unit=2/5, alt=false, line=0.2, solid=!$preview)
    makepoly(ldraw_lib__18165(), step=step, col=col, unit=unit, alt=alt, line=line, solid=solid);
ldraw_lib__18165(line=0.2);
